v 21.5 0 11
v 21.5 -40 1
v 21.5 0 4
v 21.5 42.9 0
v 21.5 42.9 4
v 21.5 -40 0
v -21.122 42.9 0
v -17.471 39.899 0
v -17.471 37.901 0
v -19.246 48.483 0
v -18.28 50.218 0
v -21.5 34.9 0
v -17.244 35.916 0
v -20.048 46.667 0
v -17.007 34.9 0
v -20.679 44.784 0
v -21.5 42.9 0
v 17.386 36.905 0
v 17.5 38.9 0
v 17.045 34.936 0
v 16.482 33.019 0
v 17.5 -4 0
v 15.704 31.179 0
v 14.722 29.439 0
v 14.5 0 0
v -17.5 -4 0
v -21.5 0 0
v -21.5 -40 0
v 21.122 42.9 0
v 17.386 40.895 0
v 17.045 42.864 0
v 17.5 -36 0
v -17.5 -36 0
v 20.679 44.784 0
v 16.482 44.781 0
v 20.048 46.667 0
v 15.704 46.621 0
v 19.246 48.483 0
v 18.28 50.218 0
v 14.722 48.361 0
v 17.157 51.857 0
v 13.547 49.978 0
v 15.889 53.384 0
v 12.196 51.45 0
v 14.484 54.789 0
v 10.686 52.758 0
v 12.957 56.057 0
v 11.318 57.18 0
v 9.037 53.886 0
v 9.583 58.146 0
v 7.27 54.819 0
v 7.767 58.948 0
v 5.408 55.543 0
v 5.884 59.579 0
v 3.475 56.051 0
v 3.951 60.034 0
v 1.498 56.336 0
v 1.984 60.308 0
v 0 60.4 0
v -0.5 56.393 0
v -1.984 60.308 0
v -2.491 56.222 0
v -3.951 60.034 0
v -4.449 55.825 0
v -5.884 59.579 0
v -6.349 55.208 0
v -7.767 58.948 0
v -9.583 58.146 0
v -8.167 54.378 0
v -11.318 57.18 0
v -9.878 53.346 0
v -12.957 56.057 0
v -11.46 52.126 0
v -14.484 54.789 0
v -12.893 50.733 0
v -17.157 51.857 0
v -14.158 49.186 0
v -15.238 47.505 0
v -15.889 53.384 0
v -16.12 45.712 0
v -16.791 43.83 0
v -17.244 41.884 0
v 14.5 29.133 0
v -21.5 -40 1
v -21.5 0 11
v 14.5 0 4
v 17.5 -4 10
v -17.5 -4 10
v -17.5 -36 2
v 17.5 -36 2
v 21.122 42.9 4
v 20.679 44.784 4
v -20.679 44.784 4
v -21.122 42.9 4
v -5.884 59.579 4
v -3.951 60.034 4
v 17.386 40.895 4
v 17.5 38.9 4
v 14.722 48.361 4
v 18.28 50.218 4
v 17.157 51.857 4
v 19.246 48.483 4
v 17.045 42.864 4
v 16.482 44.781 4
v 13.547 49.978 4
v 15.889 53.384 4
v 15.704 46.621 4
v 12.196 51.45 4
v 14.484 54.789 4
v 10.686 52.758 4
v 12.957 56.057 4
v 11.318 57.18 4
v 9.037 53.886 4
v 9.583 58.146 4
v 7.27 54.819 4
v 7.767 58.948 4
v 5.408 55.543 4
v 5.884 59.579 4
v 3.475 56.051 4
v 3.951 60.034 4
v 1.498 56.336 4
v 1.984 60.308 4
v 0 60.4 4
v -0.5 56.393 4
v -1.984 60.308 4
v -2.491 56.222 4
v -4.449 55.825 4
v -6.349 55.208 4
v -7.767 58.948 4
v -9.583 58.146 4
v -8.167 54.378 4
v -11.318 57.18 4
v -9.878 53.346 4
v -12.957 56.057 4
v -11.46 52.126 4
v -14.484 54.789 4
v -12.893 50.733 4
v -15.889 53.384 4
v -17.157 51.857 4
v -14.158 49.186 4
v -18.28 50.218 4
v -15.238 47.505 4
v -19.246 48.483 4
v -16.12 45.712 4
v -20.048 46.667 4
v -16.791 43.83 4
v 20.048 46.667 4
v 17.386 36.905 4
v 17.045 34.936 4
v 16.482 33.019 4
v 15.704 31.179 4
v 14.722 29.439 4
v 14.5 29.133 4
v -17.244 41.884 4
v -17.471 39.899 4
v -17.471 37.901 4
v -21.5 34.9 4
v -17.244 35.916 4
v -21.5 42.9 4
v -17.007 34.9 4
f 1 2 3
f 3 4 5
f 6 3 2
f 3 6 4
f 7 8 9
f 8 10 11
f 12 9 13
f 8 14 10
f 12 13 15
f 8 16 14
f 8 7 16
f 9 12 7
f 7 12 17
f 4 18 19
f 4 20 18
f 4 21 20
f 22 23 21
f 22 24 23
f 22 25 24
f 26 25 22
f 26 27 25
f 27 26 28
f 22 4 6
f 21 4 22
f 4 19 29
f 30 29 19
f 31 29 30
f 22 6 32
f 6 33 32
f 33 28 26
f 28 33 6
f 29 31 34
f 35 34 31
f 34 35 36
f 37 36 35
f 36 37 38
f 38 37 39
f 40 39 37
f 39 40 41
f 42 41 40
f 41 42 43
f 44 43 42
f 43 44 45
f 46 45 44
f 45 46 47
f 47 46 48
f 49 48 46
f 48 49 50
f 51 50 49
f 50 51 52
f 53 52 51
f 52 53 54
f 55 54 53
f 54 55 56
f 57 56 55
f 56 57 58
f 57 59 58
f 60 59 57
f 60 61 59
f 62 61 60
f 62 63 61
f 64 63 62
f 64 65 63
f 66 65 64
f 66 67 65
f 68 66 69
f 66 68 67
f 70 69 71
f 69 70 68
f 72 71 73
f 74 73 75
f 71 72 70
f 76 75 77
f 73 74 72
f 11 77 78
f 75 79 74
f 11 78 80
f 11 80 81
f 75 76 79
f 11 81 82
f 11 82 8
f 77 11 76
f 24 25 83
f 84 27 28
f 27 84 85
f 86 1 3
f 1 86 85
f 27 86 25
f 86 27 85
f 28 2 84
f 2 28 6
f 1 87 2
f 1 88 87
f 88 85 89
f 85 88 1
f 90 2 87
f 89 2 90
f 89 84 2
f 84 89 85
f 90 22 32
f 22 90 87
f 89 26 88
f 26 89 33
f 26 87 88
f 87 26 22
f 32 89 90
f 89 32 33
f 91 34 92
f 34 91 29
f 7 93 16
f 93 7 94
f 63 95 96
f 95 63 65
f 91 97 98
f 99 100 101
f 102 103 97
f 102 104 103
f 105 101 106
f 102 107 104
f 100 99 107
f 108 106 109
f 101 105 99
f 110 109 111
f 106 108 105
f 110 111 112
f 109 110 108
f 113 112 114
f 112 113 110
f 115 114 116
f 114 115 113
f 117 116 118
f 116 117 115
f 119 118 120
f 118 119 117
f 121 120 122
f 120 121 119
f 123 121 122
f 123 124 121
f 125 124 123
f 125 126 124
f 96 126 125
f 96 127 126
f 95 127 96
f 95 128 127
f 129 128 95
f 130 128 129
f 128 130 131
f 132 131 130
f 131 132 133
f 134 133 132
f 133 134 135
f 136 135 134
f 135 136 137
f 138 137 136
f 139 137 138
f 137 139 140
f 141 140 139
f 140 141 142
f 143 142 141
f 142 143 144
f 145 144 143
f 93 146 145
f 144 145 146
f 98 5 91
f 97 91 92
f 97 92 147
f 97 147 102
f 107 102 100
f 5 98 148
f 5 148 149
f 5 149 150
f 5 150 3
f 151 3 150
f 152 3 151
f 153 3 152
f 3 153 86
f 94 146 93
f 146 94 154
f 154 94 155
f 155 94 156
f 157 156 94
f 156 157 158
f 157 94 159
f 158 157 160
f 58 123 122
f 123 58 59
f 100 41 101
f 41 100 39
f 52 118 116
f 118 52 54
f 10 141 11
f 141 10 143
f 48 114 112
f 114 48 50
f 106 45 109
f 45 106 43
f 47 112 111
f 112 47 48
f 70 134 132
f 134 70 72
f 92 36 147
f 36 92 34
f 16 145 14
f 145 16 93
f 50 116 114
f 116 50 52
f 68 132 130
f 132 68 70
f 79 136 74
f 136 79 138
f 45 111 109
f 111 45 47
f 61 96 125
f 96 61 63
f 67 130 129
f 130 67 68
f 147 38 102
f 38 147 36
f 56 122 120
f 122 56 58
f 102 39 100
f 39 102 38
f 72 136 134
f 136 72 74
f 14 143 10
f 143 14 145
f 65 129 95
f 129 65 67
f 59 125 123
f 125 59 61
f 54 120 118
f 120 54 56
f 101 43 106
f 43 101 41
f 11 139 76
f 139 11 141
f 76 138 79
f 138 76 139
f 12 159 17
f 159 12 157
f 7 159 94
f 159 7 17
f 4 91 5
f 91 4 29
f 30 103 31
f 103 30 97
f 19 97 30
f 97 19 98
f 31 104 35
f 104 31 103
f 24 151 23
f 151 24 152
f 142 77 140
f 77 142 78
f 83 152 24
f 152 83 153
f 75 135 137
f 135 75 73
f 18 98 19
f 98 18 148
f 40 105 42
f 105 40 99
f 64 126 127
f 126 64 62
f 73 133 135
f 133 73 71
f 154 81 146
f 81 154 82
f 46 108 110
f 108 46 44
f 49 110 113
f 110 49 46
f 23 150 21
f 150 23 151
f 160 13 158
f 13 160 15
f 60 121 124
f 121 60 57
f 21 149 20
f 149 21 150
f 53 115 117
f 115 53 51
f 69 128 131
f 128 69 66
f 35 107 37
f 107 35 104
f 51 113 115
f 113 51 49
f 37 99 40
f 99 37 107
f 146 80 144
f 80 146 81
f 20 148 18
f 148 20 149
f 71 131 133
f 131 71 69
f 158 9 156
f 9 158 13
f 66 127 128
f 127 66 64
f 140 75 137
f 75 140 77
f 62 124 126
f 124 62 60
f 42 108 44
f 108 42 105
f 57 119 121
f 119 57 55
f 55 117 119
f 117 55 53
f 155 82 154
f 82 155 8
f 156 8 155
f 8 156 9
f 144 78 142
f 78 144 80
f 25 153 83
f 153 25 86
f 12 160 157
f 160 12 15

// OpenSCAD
height = 6;
wedge_length = 40;
// be generous; it's just hanging so slop is fine
knob_diameter = 35;
cut_out_center = "yes"; // [yes,no]
meat = 4;

/* [Hidden] */
$fa = 0.01;
wedge_low_side = height - 5;
wedge_high_side = height + 5;

union() {
	wedge();
	hook();
}

module wedge() {
	translate([-knob_diameter/2-meat, -wedge_length, 0]) {
		difference() {
			cube([knob_diameter+meat*2, wedge_length, wedge_high_side]);
			// cut wedge
			translate([-1, 0, wedge_low_side])
				rotate([atan2(wedge_high_side - wedge_low_side, wedge_length), 0, 0])
					cube([knob_diameter+meat*2+2, wedge_length*2, wedge_high_side]);
			if(cut_out_center=="yes") {
				// cut out center to save material
				translate([meat, meat, -.1])
					cube([knob_diameter, wedge_length-meat*2, wedge_high_side+meat]);
			}
		}
	}
}

module hook() {
	translate([0, knob_diameter+meat-.1, 0]) {
		difference() {
			union() {
				cylinder(r = knob_diameter/2+meat, h = meat);
				translate([-knob_diameter/2-meat, -knob_diameter-meat, 0])
					cube([knob_diameter+meat*2, knob_diameter+meat*2, meat]);
			}
			translate([0, 0, -.1]) {
				cylinder(r=knob_diameter/2, h=meat+1);
				translate([-knob_diameter/2-meat-1, -knob_diameter-meat, 0])
					cube([knob_diameter+2, knob_diameter, meat+1]);
			}
		}
	}
}
